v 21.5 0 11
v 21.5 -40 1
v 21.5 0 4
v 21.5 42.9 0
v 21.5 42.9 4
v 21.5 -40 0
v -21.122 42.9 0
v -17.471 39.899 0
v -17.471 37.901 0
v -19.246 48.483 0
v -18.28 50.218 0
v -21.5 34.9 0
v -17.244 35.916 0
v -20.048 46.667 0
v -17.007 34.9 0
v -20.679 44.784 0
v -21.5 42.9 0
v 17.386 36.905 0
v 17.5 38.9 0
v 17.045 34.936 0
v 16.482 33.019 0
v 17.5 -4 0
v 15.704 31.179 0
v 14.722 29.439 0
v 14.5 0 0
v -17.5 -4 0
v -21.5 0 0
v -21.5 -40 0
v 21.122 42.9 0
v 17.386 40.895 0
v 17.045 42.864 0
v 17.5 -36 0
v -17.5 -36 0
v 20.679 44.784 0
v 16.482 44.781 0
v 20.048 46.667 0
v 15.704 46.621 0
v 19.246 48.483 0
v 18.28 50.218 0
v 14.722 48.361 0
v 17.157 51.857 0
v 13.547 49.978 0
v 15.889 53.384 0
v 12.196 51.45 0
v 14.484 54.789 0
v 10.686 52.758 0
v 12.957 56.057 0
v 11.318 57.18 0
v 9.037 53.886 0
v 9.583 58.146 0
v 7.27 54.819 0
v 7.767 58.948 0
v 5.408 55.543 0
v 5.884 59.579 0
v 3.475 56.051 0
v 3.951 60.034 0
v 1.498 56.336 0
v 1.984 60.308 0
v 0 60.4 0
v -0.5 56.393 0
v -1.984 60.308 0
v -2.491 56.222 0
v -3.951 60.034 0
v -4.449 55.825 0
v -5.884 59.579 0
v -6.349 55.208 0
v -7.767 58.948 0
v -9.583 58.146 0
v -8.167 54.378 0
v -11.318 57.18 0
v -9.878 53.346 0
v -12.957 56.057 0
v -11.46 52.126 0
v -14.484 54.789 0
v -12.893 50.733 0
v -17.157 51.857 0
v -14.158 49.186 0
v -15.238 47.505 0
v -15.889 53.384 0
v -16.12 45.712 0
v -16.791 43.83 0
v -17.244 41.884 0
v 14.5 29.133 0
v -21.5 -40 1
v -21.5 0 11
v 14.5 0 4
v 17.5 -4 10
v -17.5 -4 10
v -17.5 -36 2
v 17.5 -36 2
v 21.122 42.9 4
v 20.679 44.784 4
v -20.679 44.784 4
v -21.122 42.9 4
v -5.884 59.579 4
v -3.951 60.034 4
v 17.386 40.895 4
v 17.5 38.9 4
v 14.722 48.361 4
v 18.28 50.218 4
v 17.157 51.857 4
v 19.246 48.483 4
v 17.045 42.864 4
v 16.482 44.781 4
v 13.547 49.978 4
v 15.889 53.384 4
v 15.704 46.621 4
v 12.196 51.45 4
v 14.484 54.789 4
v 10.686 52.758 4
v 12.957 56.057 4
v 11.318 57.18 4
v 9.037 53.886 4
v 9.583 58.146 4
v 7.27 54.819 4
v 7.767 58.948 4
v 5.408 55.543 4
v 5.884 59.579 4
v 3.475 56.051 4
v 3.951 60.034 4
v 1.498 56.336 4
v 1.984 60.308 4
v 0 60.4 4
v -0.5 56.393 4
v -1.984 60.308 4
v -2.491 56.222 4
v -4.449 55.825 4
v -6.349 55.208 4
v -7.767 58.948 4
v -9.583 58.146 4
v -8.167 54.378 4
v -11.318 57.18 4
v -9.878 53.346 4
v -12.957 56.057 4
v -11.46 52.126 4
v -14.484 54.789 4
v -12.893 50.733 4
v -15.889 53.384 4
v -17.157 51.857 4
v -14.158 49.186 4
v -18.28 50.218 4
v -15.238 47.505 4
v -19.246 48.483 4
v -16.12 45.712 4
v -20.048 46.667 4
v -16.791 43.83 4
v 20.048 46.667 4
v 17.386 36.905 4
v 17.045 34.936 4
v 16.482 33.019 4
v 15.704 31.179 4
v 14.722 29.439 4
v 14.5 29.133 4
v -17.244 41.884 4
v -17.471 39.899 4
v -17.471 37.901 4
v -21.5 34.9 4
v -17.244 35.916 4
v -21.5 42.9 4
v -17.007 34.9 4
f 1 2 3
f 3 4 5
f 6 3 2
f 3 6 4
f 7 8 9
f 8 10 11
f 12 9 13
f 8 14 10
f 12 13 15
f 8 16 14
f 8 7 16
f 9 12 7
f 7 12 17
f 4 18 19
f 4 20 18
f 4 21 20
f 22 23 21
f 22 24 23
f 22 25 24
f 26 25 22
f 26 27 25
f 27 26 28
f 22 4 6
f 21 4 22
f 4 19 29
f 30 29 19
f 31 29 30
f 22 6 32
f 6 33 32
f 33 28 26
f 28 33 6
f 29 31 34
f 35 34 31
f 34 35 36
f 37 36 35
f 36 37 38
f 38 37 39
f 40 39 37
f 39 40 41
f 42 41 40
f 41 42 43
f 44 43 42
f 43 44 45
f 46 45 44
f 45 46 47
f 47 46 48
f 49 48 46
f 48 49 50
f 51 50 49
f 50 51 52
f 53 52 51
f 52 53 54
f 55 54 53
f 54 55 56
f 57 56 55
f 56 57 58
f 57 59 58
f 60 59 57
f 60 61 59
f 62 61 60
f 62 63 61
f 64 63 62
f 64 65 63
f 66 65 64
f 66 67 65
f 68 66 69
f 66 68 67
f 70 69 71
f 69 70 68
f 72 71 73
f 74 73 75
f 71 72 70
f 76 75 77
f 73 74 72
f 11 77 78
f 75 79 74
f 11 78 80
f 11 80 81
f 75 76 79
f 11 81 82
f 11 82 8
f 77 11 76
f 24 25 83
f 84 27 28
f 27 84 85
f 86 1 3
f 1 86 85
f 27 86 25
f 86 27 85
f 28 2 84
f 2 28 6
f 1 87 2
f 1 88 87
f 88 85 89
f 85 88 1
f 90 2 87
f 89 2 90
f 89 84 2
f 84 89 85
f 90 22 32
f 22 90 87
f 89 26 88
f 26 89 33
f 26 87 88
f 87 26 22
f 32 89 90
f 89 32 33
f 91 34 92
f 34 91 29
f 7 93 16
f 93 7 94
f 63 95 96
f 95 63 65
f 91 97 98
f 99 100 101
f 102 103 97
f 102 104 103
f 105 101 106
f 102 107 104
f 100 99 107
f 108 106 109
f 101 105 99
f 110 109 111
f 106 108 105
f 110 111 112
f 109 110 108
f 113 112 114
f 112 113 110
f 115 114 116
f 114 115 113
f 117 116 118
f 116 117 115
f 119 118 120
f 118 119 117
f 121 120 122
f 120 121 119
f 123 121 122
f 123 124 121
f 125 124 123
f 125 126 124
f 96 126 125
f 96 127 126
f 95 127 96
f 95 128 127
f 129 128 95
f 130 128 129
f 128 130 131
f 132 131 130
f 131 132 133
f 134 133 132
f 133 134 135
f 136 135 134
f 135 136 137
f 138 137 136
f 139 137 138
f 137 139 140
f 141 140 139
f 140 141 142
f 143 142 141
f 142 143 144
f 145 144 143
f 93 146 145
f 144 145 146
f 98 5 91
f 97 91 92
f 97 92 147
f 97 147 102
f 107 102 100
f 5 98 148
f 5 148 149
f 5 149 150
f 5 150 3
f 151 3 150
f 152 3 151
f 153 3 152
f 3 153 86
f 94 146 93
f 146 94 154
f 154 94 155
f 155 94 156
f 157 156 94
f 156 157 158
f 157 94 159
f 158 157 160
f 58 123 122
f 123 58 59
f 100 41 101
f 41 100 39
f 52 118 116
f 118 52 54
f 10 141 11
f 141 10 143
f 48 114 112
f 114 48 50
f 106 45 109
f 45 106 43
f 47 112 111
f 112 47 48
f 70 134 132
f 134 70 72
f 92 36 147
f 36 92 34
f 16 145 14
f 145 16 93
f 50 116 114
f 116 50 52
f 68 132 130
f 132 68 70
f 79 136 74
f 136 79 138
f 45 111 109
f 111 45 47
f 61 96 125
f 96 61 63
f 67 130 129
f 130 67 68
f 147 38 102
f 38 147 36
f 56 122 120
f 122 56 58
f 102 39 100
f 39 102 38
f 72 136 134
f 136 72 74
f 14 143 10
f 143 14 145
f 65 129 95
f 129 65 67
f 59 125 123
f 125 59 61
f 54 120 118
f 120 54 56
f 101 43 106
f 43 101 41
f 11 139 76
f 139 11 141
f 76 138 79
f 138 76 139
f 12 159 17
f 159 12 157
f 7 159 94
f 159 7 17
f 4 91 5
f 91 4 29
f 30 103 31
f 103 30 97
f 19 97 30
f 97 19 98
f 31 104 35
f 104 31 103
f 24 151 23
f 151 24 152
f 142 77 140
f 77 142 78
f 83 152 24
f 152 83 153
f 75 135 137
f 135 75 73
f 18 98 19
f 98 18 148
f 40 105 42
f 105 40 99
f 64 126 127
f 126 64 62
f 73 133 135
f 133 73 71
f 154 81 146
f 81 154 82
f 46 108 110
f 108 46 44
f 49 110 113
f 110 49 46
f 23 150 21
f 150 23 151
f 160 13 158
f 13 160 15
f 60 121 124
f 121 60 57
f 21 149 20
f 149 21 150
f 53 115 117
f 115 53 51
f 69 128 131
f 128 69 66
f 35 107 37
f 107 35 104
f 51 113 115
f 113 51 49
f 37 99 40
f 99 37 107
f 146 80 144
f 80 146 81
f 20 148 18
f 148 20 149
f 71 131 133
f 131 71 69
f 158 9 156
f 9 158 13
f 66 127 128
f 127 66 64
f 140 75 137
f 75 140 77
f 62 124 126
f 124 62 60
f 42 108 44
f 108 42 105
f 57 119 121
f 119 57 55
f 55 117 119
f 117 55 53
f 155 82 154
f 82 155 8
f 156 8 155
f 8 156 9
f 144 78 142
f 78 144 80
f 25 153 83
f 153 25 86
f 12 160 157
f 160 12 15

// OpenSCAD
height = 6;
wedge_length = 40;
// be generous; it's just hanging so slop is fine
knob_diameter = 35;
cut_out_center = "yes"; // [yes,no]
meat = 4;

/* [Hidden] */
$fa = 0.01;
wedge_low_side = height - 5;
wedge_high_side = height + 5;

union() {
	wedge();
	hook();
}

module wedge() {
	translate([-knob_diameter/2-meat, -wedge_length, 0]) {
		difference() {
			cube([knob_diameter+meat*2, wedge_length, wedge_high_side]);
			// cut wedge
			translate([-1, 0, wedge_low_side])
				rotate([atan2(wedge_high_side - wedge_low_side, wedge_length), 0, 0])
					cube([knob_diameter+meat*2+2, wedge_length*2, wedge_high_side]);
			if(cut_out_center=="yes") {
				// cut out center to save material
				translate([meat, meat, -.1])
					cube([knob_diameter, wedge_length-meat*2, wedge_high_side+meat]);
			}
		}
	}
}

module hook() {
	translate([0, knob_diameter+meat-.1, 0]) {
		difference() {
			union() {
				cylinder(r = knob_diameter/2+meat, h = meat);
				translate([-knob_diameter/2-meat, -knob_diameter-meat, 0])
					cube([knob_diameter+meat*2, knob_diameter+meat*2, meat]);
			}
			translate([0, 0, -.1]) {
				cylinder(r=knob_diameter/2, h=meat+1);
				translate([-knob_diameter/2-meat-1, -knob_diameter-meat, 0])
					cube([knob_diameter+2, knob_diameter, meat+1]);
			}
		}
	}
}
